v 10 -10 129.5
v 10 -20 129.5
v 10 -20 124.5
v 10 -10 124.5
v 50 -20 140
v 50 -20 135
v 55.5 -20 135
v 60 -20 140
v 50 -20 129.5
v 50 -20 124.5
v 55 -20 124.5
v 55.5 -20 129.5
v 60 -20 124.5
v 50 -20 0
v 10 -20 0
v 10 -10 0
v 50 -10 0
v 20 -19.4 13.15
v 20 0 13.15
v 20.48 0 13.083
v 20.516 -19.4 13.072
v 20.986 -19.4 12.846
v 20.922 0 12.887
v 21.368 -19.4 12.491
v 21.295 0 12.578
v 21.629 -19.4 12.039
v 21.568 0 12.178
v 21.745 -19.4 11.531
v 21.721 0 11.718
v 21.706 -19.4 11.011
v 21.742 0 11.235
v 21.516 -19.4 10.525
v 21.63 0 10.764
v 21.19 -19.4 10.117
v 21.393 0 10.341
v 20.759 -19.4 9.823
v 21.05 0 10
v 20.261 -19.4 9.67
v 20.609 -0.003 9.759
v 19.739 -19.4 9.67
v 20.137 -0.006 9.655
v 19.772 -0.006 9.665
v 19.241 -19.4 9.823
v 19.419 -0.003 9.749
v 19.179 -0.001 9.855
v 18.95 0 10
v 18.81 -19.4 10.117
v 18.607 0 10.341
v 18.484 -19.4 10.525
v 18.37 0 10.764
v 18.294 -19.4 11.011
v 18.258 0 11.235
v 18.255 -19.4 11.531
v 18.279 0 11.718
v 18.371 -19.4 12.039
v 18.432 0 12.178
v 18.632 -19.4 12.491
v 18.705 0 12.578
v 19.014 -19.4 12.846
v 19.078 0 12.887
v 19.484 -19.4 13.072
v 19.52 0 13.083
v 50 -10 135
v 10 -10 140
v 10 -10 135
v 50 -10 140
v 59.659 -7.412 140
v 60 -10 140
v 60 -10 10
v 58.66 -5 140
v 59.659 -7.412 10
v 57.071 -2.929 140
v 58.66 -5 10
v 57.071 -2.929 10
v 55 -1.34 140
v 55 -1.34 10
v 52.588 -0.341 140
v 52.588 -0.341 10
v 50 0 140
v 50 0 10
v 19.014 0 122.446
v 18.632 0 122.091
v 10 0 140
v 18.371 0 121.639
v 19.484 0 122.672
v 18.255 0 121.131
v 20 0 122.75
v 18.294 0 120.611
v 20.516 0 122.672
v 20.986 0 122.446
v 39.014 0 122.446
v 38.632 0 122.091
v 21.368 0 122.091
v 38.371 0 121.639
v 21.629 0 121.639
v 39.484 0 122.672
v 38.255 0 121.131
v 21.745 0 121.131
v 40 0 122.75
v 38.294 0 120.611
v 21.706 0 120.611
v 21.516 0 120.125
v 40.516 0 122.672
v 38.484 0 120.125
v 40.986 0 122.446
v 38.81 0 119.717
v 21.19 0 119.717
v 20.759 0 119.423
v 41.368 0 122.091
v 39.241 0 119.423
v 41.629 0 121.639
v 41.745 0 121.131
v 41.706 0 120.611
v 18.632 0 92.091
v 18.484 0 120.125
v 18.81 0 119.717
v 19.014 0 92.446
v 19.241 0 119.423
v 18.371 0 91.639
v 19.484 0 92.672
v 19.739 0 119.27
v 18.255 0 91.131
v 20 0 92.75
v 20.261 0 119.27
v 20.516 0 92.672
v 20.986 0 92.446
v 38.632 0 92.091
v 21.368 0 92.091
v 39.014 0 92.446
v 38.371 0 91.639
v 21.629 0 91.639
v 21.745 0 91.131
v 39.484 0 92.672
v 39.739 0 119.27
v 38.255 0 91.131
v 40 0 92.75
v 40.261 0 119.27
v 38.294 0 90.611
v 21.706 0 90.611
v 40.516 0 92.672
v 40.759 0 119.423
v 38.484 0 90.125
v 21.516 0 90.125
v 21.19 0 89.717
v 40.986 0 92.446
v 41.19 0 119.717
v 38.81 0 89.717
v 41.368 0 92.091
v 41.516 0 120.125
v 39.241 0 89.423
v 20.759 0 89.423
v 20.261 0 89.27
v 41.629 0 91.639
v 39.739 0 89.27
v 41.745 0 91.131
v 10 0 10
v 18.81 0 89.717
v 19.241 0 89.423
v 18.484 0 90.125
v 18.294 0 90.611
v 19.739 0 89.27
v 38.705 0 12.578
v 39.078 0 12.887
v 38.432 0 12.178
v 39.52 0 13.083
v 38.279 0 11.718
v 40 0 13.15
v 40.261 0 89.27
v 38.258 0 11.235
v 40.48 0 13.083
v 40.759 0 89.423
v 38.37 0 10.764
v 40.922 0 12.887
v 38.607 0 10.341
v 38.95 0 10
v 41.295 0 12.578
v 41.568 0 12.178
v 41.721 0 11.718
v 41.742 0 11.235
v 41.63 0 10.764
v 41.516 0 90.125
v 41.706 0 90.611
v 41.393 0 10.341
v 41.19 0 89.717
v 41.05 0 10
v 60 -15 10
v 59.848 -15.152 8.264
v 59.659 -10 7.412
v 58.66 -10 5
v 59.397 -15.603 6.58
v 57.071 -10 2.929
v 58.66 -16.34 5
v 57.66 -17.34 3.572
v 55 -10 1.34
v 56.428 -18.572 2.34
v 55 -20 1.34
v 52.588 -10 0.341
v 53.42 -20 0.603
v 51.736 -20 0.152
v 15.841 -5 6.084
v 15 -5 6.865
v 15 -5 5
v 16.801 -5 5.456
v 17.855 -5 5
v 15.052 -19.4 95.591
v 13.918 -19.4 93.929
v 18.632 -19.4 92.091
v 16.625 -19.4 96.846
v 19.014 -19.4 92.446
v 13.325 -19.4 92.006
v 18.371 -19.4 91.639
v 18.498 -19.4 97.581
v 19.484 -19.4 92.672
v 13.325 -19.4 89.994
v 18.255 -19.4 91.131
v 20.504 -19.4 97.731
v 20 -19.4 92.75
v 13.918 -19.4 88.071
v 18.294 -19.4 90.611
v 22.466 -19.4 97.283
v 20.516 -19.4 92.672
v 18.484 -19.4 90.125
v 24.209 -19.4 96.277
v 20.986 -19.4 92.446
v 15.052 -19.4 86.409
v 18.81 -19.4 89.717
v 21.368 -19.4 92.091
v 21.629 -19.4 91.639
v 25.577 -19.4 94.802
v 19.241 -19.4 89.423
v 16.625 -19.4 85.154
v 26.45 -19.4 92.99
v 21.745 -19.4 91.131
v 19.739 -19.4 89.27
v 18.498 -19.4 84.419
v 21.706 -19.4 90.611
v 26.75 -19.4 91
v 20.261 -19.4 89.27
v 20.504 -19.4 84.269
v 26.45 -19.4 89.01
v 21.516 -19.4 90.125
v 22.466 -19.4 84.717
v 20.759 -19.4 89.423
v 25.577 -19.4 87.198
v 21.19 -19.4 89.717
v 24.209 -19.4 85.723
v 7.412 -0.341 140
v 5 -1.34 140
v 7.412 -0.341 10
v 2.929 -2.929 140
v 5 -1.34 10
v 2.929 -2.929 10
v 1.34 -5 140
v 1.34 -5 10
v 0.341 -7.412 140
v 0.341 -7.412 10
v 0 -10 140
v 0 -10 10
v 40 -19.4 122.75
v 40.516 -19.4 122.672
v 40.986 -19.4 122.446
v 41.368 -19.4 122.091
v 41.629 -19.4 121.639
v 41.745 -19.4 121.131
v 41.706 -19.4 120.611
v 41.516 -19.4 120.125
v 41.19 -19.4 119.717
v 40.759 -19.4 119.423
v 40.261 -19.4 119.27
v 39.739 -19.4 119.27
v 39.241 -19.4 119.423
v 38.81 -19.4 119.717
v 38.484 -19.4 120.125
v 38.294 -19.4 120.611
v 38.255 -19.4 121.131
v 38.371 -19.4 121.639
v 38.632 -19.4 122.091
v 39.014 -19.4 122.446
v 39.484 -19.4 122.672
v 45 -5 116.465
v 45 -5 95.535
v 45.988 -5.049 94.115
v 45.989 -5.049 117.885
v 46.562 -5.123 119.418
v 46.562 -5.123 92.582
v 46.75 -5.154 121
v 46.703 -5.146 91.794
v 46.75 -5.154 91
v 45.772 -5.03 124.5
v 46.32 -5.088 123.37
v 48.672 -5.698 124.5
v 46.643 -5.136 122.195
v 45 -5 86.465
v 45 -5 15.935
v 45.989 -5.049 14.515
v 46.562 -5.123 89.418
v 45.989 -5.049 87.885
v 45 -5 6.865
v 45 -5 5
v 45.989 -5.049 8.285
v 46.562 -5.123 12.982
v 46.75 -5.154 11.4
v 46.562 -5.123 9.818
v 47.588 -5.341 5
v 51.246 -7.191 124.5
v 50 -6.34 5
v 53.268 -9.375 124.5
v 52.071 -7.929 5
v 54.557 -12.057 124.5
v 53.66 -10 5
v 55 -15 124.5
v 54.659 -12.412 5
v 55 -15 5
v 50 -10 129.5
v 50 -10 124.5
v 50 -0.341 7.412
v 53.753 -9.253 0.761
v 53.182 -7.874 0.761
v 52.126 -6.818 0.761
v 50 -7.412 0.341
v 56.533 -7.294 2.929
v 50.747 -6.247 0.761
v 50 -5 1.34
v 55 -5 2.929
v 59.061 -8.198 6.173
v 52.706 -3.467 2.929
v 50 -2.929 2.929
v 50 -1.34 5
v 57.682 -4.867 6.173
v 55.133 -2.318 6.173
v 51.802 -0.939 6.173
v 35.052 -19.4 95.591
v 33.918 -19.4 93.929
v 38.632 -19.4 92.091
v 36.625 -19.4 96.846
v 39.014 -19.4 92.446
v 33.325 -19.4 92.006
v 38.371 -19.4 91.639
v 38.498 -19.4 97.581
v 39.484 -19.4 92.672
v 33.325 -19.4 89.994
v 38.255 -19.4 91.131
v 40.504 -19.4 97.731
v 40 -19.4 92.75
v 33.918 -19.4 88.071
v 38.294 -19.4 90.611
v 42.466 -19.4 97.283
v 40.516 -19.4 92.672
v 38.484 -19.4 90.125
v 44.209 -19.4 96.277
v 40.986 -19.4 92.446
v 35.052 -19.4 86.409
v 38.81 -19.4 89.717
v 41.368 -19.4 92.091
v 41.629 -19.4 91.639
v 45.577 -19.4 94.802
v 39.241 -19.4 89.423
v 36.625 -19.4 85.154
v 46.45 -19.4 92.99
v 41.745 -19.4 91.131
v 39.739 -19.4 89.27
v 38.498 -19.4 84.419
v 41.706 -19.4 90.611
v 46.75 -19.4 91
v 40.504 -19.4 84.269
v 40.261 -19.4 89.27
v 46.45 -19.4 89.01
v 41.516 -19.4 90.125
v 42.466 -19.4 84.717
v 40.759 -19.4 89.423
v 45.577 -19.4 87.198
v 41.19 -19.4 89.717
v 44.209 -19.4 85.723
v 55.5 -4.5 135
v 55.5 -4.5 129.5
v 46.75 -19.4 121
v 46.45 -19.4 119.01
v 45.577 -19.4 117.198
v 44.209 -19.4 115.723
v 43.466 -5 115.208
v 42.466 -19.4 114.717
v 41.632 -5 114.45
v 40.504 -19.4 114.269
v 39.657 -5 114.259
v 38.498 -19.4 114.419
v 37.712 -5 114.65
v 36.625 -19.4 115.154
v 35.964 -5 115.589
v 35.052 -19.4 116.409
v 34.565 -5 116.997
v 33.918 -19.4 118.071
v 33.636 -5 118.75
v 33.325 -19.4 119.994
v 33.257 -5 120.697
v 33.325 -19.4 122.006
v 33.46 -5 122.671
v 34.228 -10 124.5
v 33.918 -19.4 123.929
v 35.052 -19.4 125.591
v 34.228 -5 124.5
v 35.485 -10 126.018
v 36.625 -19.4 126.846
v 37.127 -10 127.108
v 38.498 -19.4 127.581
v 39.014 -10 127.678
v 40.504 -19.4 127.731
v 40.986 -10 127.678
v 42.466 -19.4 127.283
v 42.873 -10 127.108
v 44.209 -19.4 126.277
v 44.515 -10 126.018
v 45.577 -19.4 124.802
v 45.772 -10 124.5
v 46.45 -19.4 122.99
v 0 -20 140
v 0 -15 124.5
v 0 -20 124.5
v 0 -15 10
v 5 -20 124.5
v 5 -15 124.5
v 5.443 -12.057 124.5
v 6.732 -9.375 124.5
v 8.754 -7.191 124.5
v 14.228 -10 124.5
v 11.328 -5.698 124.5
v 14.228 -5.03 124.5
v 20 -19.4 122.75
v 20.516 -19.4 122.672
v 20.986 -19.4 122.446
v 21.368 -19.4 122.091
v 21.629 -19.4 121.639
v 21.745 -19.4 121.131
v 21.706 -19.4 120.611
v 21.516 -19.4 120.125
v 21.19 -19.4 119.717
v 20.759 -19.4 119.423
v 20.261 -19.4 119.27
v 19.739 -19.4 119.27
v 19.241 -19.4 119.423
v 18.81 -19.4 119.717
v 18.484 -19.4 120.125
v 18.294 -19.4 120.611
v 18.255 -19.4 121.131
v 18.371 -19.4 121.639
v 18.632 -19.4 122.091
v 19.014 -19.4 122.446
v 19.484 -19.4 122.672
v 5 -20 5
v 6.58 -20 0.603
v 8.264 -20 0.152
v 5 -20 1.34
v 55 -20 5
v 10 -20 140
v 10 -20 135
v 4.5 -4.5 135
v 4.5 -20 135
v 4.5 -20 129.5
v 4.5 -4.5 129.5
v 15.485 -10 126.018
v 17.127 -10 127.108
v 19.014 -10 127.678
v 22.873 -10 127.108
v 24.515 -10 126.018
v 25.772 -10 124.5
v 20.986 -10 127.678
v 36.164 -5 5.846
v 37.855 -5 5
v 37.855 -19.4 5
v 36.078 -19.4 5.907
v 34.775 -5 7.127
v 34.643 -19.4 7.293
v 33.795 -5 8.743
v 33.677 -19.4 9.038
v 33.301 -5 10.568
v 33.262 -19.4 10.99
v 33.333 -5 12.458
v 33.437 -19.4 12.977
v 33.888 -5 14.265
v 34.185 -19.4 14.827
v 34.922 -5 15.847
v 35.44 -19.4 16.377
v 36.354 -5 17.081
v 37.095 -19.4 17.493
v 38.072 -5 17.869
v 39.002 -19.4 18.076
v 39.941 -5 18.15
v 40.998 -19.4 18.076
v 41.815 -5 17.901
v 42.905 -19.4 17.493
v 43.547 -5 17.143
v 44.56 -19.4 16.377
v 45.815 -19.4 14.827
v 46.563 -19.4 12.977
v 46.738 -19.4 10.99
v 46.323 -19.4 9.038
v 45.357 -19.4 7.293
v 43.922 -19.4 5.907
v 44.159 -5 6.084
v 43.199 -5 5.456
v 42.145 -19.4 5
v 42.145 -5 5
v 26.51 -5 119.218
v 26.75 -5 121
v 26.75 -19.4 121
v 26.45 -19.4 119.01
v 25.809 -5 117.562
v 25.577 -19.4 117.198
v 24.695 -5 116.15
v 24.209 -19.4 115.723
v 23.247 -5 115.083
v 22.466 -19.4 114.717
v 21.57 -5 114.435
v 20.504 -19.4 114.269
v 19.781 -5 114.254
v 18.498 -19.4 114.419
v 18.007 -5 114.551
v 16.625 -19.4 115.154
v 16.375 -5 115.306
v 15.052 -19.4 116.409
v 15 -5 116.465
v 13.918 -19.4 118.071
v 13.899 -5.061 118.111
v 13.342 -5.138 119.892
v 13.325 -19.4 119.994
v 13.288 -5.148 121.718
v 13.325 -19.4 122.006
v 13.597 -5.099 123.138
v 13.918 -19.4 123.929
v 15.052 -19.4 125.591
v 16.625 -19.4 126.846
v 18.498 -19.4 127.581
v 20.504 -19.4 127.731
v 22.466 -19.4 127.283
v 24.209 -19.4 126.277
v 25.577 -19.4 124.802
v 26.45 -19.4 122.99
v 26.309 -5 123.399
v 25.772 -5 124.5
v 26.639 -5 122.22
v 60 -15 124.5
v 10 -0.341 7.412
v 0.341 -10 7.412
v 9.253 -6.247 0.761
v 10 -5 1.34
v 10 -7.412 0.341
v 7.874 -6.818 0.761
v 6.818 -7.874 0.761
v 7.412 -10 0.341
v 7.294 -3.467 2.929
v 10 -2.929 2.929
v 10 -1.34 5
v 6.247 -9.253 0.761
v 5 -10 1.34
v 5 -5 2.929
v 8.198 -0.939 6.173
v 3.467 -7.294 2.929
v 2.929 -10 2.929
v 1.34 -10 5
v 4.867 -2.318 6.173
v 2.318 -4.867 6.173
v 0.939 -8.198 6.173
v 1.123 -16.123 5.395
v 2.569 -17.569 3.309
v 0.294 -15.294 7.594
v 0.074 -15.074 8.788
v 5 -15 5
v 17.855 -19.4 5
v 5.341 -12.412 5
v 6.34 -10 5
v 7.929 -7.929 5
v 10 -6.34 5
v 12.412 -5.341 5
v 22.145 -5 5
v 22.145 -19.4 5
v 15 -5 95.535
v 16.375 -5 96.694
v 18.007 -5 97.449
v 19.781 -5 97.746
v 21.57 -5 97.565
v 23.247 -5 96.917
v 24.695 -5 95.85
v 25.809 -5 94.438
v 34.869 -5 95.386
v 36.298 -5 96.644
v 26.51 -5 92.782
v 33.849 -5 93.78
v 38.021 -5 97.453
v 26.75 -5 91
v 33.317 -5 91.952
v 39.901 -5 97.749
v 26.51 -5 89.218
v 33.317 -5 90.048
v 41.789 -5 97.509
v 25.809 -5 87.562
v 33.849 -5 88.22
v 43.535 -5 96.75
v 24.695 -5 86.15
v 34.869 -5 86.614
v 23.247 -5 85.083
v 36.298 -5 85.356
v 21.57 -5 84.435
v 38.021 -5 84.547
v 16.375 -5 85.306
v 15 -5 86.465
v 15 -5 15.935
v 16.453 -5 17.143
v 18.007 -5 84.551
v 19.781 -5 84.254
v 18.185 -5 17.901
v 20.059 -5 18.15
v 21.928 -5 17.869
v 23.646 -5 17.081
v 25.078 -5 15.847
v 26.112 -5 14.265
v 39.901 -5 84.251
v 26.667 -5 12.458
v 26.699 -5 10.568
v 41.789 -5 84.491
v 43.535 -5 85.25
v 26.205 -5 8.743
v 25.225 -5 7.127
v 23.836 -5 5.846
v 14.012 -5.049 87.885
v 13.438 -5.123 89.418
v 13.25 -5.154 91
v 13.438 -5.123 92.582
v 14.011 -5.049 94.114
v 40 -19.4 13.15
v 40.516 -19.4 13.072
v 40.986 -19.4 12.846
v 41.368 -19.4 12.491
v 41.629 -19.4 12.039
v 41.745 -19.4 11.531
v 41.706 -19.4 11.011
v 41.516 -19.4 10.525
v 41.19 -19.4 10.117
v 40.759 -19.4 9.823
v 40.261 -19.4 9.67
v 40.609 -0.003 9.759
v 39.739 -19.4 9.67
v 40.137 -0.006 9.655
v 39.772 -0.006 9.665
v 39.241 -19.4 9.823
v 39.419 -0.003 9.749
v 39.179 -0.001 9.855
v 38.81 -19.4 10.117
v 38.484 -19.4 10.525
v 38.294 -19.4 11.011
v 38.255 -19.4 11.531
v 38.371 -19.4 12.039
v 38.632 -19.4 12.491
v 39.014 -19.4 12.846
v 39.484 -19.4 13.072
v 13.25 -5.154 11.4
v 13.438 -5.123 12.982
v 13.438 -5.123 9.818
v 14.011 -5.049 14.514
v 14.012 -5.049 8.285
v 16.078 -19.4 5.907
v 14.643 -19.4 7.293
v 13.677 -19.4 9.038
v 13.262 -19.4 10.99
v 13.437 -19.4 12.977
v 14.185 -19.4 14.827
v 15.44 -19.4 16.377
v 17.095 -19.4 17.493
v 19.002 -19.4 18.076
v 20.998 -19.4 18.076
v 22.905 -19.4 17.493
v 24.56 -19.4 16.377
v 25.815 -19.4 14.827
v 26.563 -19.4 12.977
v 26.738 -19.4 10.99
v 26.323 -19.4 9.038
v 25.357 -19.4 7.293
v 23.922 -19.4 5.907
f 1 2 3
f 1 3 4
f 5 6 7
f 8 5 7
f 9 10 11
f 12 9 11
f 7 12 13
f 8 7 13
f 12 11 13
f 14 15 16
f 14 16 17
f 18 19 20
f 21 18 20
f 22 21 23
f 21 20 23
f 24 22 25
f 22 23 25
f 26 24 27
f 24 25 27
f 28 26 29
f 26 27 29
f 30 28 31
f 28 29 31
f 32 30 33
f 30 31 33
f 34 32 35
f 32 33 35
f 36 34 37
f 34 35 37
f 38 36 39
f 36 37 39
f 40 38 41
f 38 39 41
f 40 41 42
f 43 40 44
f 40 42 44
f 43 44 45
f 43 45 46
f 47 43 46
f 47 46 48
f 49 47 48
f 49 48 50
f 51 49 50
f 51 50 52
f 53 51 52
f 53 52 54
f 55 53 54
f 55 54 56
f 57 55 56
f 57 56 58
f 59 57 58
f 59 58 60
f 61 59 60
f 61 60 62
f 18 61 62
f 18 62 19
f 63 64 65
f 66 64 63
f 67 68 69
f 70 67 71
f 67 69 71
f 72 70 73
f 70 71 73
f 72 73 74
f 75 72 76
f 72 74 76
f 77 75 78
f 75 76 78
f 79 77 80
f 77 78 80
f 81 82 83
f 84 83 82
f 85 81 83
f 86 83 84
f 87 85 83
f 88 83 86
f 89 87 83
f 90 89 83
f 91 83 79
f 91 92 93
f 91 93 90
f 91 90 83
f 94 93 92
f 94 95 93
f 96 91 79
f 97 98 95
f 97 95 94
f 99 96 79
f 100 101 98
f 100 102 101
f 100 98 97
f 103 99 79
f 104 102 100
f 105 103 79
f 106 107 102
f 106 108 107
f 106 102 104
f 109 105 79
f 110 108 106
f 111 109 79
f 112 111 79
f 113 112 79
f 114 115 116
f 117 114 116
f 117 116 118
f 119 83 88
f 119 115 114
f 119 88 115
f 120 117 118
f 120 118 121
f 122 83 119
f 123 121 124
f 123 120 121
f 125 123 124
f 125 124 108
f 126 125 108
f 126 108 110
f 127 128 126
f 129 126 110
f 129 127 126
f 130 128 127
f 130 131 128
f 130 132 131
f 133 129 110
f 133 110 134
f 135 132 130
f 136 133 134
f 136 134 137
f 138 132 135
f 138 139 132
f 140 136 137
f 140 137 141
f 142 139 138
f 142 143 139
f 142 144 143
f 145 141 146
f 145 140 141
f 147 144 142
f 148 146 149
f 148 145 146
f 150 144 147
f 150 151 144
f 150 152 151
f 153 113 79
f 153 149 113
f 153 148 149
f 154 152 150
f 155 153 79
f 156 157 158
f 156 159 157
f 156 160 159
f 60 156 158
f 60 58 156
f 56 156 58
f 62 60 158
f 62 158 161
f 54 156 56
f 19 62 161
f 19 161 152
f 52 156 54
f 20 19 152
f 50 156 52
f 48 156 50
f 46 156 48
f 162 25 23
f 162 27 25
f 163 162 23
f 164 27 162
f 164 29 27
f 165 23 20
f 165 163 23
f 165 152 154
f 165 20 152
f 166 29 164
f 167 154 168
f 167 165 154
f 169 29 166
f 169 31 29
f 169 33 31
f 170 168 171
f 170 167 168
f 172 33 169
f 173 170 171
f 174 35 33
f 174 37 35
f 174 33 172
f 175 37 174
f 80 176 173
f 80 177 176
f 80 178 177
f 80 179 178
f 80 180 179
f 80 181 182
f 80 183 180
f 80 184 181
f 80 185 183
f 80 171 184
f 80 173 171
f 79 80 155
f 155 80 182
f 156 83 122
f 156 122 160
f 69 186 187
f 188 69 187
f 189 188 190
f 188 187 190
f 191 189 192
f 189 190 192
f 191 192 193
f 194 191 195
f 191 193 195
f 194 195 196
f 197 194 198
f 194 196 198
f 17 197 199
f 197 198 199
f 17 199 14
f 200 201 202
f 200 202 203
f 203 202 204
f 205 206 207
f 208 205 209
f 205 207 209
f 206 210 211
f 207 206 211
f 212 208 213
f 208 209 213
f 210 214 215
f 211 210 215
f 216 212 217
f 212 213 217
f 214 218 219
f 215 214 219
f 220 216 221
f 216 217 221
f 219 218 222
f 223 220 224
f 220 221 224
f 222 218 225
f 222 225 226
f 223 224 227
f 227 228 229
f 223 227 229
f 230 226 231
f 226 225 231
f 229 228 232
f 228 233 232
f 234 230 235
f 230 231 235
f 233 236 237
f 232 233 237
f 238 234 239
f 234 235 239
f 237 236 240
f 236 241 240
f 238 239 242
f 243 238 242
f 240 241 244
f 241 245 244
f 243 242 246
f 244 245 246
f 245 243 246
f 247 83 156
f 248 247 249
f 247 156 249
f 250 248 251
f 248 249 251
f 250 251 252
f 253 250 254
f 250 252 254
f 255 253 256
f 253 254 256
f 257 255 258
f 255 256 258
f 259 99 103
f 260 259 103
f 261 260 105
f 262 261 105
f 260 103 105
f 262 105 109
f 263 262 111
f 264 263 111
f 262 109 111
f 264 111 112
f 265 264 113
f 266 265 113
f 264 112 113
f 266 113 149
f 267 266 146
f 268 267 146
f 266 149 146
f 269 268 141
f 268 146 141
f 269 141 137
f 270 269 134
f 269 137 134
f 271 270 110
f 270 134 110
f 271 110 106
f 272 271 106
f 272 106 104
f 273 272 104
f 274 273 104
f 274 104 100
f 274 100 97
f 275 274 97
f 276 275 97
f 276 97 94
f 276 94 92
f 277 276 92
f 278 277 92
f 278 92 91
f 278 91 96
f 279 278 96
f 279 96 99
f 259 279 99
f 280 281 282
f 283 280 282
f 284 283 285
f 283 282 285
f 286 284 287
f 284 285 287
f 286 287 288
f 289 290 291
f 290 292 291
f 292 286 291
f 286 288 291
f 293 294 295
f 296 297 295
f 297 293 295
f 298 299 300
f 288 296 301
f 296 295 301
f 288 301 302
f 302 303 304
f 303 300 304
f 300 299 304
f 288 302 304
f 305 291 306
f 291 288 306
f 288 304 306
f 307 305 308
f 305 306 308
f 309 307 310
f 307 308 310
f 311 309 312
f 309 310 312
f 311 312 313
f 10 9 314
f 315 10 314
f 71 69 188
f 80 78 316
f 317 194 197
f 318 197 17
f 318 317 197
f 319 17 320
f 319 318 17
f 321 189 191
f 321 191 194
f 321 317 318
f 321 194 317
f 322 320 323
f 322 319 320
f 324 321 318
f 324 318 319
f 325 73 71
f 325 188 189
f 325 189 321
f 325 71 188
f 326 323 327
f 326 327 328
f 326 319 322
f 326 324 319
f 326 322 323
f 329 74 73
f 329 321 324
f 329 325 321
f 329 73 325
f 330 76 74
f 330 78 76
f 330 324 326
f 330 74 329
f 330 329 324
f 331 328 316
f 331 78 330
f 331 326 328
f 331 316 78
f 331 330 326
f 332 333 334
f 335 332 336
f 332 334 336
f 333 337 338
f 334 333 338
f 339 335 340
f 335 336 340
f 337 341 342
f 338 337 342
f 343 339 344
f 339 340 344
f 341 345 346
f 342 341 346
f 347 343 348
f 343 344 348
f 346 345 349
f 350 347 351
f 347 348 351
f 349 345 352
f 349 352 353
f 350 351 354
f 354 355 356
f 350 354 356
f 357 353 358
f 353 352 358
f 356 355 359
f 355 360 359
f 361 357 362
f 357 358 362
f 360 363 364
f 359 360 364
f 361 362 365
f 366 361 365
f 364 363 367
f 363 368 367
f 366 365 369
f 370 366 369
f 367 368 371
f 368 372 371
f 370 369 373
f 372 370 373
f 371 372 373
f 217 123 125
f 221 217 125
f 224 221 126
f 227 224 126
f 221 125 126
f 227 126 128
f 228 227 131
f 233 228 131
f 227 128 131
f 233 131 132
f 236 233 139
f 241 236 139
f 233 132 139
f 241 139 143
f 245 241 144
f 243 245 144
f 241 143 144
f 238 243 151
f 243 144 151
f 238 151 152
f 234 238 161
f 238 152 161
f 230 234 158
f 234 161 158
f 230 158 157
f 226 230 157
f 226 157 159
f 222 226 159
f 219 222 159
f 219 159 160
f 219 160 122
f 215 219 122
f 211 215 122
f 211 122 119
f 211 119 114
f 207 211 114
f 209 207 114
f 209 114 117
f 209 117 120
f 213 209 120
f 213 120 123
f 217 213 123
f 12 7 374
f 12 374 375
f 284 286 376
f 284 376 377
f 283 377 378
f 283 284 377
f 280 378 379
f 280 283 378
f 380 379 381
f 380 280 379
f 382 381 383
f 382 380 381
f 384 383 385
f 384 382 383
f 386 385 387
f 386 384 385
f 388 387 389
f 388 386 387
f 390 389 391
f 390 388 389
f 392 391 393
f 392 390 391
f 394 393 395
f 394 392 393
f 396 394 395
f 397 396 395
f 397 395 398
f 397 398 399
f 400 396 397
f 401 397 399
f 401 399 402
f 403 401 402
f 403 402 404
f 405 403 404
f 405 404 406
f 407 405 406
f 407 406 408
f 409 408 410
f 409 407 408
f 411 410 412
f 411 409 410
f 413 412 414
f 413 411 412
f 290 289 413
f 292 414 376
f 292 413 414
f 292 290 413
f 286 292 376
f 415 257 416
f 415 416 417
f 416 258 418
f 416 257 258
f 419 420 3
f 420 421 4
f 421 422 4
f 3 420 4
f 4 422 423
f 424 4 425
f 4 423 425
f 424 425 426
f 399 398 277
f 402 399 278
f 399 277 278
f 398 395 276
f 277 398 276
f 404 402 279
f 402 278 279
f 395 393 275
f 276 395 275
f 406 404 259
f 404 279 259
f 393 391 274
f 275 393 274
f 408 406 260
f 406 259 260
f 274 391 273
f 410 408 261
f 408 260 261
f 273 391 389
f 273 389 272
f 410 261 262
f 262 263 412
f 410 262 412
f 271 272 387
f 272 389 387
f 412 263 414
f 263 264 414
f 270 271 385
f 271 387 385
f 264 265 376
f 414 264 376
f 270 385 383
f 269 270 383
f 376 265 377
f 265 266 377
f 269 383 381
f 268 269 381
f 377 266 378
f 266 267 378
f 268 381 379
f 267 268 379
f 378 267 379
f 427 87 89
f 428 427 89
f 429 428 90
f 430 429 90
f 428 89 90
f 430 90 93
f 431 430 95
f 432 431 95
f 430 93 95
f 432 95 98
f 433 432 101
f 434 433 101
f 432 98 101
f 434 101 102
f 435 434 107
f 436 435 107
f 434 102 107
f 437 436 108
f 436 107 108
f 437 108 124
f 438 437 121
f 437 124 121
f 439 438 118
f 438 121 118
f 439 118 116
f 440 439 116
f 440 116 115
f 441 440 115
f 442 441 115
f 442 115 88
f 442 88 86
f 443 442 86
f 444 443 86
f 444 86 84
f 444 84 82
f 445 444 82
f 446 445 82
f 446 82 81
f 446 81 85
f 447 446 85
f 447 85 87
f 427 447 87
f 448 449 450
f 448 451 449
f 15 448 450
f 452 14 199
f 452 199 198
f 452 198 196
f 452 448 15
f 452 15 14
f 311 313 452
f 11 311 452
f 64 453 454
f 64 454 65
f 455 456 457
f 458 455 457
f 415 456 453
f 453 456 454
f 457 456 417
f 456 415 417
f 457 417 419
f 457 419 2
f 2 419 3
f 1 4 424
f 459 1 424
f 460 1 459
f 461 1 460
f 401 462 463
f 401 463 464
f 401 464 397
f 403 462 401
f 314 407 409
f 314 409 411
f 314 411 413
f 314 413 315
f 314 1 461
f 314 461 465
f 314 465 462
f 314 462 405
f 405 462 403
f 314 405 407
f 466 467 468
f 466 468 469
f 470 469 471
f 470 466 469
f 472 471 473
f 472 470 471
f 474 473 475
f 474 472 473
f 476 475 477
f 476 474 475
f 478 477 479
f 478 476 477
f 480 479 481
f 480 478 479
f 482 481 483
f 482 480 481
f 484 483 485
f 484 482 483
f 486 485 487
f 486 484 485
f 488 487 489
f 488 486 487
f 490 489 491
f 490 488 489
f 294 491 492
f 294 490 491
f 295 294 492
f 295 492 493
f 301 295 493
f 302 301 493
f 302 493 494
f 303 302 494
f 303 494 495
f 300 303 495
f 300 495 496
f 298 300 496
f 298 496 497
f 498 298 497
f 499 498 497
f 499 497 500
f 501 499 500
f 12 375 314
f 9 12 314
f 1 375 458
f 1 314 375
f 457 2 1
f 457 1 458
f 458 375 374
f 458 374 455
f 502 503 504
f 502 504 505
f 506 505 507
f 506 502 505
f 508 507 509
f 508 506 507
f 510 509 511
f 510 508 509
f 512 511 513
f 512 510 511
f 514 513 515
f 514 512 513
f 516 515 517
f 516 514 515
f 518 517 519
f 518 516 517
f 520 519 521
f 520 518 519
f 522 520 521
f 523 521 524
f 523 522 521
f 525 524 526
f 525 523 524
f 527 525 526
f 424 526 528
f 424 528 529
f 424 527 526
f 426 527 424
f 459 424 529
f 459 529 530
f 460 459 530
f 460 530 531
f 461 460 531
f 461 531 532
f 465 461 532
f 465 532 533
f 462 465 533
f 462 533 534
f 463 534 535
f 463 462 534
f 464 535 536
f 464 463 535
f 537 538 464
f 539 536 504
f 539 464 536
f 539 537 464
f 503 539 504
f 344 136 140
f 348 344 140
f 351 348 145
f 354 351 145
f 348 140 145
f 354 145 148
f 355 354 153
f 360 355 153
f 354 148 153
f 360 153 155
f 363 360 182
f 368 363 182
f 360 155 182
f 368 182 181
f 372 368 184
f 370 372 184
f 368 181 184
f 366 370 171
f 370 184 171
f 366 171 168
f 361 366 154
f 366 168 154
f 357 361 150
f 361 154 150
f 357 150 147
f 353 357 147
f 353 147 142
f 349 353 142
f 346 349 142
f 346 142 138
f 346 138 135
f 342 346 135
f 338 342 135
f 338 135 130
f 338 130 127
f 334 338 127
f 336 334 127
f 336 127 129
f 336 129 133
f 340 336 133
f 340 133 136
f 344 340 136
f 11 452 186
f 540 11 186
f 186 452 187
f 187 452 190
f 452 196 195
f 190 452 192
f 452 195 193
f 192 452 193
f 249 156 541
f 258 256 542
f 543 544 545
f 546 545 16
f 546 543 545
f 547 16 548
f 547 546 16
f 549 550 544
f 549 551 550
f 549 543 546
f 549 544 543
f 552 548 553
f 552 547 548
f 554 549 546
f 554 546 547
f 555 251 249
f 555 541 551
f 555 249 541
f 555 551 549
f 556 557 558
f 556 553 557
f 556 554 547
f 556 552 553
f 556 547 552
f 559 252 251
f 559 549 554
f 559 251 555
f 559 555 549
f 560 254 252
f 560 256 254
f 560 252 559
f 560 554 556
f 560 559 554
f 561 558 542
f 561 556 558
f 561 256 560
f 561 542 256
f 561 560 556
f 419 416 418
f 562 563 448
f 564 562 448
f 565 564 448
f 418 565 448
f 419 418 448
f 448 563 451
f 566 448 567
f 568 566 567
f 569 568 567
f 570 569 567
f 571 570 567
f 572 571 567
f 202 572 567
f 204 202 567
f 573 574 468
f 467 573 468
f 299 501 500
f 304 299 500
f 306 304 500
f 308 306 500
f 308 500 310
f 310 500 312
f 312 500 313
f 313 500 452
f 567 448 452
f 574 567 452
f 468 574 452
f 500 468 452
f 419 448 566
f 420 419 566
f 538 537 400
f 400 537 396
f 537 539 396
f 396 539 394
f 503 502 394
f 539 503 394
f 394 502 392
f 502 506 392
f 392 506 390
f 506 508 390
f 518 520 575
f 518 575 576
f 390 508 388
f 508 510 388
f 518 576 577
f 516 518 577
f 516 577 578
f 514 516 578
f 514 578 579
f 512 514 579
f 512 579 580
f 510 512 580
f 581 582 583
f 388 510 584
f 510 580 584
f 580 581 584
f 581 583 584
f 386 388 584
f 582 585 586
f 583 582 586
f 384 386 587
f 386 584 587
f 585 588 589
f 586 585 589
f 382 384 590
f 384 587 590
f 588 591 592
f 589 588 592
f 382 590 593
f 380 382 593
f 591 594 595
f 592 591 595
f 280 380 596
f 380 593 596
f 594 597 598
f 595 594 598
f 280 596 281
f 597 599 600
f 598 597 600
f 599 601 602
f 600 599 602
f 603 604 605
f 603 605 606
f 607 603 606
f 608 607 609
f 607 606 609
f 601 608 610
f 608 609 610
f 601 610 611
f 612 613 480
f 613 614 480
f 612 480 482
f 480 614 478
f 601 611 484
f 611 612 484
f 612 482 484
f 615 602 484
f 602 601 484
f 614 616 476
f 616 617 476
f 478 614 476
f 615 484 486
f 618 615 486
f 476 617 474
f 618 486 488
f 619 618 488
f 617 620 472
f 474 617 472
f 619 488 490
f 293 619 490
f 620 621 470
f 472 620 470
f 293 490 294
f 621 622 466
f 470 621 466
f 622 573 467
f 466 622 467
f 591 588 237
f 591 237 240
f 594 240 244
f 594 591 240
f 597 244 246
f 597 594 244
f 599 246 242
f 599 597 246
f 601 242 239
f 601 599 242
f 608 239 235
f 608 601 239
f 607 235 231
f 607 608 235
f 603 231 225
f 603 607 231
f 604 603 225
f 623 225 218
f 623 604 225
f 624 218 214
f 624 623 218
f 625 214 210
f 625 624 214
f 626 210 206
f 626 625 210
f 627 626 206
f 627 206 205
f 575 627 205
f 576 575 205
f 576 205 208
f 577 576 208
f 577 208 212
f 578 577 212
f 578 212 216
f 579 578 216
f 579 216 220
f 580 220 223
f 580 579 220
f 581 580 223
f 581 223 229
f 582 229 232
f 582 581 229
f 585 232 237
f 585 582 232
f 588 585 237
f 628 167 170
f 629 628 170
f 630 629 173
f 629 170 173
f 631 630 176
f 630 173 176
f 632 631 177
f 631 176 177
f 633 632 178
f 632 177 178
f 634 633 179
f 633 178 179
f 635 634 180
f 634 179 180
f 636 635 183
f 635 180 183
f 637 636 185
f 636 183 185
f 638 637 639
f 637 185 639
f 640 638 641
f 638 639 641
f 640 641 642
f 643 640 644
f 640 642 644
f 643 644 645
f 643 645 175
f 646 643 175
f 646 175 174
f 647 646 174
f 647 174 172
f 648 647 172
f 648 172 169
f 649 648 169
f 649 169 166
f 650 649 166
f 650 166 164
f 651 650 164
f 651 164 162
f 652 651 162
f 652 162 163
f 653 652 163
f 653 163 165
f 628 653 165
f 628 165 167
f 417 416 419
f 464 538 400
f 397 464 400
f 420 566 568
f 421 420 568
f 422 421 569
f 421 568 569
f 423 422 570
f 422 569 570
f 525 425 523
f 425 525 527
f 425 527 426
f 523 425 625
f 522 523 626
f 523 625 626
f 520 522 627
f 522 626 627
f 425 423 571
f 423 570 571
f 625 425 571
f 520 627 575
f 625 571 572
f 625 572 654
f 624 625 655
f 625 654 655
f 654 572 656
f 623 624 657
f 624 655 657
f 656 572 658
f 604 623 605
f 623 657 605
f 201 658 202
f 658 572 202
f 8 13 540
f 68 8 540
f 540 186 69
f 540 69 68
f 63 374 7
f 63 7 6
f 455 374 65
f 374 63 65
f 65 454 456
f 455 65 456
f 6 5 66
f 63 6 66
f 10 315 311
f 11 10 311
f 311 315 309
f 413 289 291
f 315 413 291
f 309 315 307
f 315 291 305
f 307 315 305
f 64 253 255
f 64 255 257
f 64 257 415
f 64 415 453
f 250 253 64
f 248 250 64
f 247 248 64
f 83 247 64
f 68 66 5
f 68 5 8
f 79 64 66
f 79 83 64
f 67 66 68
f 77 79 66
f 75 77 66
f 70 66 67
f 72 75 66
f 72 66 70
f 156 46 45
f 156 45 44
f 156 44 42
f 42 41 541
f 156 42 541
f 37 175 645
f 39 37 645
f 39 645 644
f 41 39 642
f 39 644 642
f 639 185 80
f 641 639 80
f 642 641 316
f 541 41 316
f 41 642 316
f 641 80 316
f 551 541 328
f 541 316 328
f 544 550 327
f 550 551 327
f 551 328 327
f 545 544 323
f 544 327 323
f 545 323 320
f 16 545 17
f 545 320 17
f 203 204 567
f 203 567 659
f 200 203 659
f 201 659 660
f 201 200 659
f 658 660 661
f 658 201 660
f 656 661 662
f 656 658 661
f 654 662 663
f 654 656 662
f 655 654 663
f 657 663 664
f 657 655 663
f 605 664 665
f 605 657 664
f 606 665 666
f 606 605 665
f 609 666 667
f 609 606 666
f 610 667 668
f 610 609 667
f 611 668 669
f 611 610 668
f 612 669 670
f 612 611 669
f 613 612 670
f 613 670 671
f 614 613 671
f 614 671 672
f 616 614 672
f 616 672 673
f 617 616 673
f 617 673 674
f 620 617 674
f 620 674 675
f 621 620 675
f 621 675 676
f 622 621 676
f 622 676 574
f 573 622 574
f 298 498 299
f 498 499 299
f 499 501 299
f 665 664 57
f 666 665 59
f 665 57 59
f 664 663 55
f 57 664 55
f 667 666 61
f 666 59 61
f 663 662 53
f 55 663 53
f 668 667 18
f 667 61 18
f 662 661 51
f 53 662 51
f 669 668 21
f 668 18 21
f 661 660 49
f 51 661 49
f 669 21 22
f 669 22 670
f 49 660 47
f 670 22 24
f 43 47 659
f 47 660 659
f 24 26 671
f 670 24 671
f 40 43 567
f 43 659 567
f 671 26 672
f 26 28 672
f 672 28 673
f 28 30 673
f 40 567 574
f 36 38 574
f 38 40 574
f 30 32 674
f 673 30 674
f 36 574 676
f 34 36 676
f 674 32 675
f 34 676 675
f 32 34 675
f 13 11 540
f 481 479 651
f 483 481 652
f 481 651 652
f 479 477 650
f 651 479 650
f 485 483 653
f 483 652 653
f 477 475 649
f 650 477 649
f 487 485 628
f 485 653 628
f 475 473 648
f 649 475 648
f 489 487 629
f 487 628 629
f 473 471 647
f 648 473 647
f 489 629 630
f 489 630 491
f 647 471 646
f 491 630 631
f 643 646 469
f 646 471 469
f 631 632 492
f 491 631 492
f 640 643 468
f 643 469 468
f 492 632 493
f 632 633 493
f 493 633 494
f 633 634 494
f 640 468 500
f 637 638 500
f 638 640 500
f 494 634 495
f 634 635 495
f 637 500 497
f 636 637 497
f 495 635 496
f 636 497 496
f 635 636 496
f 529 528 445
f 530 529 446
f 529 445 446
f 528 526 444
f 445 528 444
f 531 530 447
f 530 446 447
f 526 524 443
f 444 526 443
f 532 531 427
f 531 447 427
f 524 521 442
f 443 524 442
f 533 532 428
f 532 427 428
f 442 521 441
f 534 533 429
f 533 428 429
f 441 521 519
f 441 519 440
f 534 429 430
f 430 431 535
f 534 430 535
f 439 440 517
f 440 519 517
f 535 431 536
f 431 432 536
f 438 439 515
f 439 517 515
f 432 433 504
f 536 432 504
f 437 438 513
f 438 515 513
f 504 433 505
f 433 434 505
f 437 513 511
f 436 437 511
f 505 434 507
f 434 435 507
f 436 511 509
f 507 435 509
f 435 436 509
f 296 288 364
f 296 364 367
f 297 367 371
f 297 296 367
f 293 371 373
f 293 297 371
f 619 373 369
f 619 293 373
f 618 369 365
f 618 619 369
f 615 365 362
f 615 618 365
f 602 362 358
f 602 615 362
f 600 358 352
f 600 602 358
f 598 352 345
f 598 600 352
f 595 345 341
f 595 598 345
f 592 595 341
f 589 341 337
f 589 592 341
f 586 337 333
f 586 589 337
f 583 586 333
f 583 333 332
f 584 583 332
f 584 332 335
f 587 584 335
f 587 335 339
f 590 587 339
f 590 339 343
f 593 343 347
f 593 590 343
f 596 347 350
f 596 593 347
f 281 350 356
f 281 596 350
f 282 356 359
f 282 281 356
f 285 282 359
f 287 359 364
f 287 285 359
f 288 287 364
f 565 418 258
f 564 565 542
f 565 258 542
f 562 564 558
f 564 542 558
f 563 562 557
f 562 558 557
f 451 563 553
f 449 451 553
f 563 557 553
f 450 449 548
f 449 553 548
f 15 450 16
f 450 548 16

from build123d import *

# Parameters (mm, degrees)
BOSS_EXTRUDE1_DEPTH = 124.5
BOSS_EXTRUDE2_DEPTH = 15.5
SKETCH4_W           = 40
SKETCH4_H           = 10
CUT_EXTRUDE3_DEPTH  = 24.5
BOSS_EXTRUDE4_REACH = 155.623
SKETCH8_W           = 50
SKETCH8_H           = 5
SKETCH9_W           = 51
SKETCH9_H           = 5.5
CUT_EXTRUDE4_DEPTH  = 15.5
SKETCH10_R          = 6.75
SKETCH10_R_2        = 1.75
BOSS_EXTRUDE5_DEPTH = 19.4
SKETCH11_R          = 1.75
CUT_EXTRUDE5_DEPTH  = 154.622914957
FILLET1_R           = 10


with BuildPart() as part:
    # Sketch1 → Boss-Extrude1 (new body)
    with BuildSketch(Plane.XY):
        with BuildLine():
            Line((15, -5), (45, -5))
            ThreePointArc((45, -5), (52.071067812, -7.928932188), (55, -15))
            Line((55, -15), (55, -20))
            Line((55, -20), (60, -15))
            Line((60, -15), (60, -10))
            ThreePointArc((60, -10), (57.071067812, -2.928932188), (50, 0))
            Line((50, 0), (10, 0))
            ThreePointArc((10, 0), (2.928932188, -2.928932188), (0, -10))
            Line((0, -10), (0, -15))
            Line((0, -15), (5, -20))
            Line((5, -20), (5, -15))
            ThreePointArc((5, -15), (7.928932188, -7.928932188), (15, -5))
        make_face()
    extrude(amount=BOSS_EXTRUDE1_DEPTH)

    # Sketch2 → Boss-Extrude2 (add)
    with BuildSketch(Plane.XY.offset(124.5)):
        with BuildLine():
            Line((50, 0), (10, 0))
            ThreePointArc((10, 0), (2.928932188, -2.928932188), (0, -10))
            Line((0, -10), (0, -20))
            Line((0, -20), (5, -20))
            Line((5, -20), (55, -20))
            Line((55, -20), (60, -20))
            Line((60, -20), (60, -10))
            ThreePointArc((60, -10), (57.071067812, -2.928932188), (50, 0))
        make_face()
    extrude(amount=BOSS_EXTRUDE2_DEPTH)

    # Sketch4 → Cut-Extrude3 (cut)
    with BuildSketch(Plane.XY.offset(140)):
        with Locations((30, -15)):
            Rectangle(SKETCH4_W, SKETCH4_H)
    extrude(amount=-CUT_EXTRUDE3_DEPTH, mode=Mode.SUBTRACT)

    # Boss-Extrude4: up to this face of the body (flat: up to its plane)
    boss_extrude4_end = Plane(part.part.faces().sort_by_distance((30, -5, 62.25))[0])
    # Sketch8 → Boss-Extrude4 (add, up to the picked face)
    with BuildSketch(Plane.XZ.offset(20), mode=Mode.PRIVATE) as boss_extrude4_sk1:
        with Locations((30, 2.5)):
            Rectangle(SKETCH8_W, SKETCH8_H)
    boss_extrude4_tool1 = split(extrude(boss_extrude4_sk1.sketch, amount=-BOSS_EXTRUDE4_REACH, mode=Mode.PRIVATE), bisect_by=boss_extrude4_end, keep=Keep.BOTH, mode=Mode.PRIVATE)
    add(boss_extrude4_tool1.solids().sort_by(Axis((30, -20, 2.5), (0, 1, 0)))[0])

    # Sketch9 → Cut-Extrude4 (cut)
    with BuildSketch(Plane(origin=(0, -20, 0), x_dir=(-1, 0, 0), z_dir=(0, -1, 0))):
        with Locations((-30, -132.25)):
            Rectangle(SKETCH9_W, SKETCH9_H)
    extrude(amount=-CUT_EXTRUDE4_DEPTH, mode=Mode.SUBTRACT)

    # Sketch10 → Boss-Extrude5 (add)
    with BuildSketch(Plane(origin=(0, 0, 0), x_dir=(1, 0, 0), z_dir=(0, 1, 0))):
        with Locations((20, -11.4)):
            Circle(SKETCH10_R)
        with Locations(Location((20, -11.4, 0), (0, 0, 270))):
            Circle(SKETCH10_R_2, mode=Mode.SUBTRACT)
    boss_extrude5 = extrude(amount=-BOSS_EXTRUDE5_DEPTH)

    # Sketch11 → Cut-Extrude5 (cut, through all)
    with BuildSketch(Plane(origin=(0, 0, 0), x_dir=(1, 0, 0), z_dir=(0, 1, 0))):
        with Locations(Location((20, -11.4, 0), (0, 0, 270))):
            Circle(SKETCH11_R)
    cut_extrude5 = extrude(amount=-CUT_EXTRUDE5_DEPTH, mode=Mode.SUBTRACT)

    # Sketch-Pattern1: Boss-Extrude5, Cut-Extrude5 at 5 more places
    with Locations((20, 0, 0), (20, 0, 79.6), (0, 0, 79.6), (0, 0, 109.6), (20, 0, 109.6)):
        add(boss_extrude5)
        add(cut_extrude5, mode=Mode.SUBTRACT)

    # Fillet1
    # the kernel refuses this fillet: 10 mm, written as the material it takes off along each edge
    with BuildSketch(Plane(origin=(60, -40, 0), x_dir=(0, 0, 1), z_dir=(0, 1, 0)), Plane(origin=(0, -10, 0), x_dir=(0, 0, 1), z_dir=(0, -1, 0))) as fillet1_piece_1:
        with BuildLine():
            CenterArc((FILLET1_R, -FILLET1_R), FILLET1_R, 90, 90)
            Line((0, -FILLET1_R), (0, 0))
            Line((0, 0), (FILLET1_R, 0))
        make_face()
    extrude(amount=30, mode=Mode.SUBTRACT)
    with BuildSketch(Plane(origin=(50, -10, 0), x_dir=(1, 0, 0), z_dir=(0, -1, 0))) as fillet1_piece_2:
        with BuildLine():
            CenterArc((10 - FILLET1_R, FILLET1_R), FILLET1_R, 270, 90)
            Line((10, FILLET1_R), (10, 0))
            Line((10, 0), (10 - FILLET1_R, 0))
        make_face()
    revolve(axis=Axis((50, -10, 0), (0, 0, 1)), revolution_arc=90, mode=Mode.SUBTRACT)
    with BuildSketch(Plane(origin=(10, -10, 0), x_dir=(0, 1, 0), z_dir=(1, 0, 0))) as fillet1_piece_3:
        with BuildLine():
            CenterArc((10 - FILLET1_R, FILLET1_R), FILLET1_R, 270, 90)
            Line((10 - FILLET1_R, 0), (10, 0))
            Line((10, 0), (10, FILLET1_R))
        make_face()
    revolve(axis=Axis((10, -10, 0), (0, 0, 1)), revolution_arc=90, mode=Mode.SUBTRACT)
    with BuildSketch(Plane(origin=(50, 0, 0), x_dir=(0, 0, 1), z_dir=(-1, 0, 0))) as fillet1_piece_4:
        with BuildLine():
            CenterArc((FILLET1_R, -FILLET1_R), FILLET1_R, 90, 90)
            Line((0, -FILLET1_R), (0, 0))
            Line((0, 0), (FILLET1_R, 0))
        make_face()
    extrude(amount=40, mode=Mode.SUBTRACT)


solid = part.part
